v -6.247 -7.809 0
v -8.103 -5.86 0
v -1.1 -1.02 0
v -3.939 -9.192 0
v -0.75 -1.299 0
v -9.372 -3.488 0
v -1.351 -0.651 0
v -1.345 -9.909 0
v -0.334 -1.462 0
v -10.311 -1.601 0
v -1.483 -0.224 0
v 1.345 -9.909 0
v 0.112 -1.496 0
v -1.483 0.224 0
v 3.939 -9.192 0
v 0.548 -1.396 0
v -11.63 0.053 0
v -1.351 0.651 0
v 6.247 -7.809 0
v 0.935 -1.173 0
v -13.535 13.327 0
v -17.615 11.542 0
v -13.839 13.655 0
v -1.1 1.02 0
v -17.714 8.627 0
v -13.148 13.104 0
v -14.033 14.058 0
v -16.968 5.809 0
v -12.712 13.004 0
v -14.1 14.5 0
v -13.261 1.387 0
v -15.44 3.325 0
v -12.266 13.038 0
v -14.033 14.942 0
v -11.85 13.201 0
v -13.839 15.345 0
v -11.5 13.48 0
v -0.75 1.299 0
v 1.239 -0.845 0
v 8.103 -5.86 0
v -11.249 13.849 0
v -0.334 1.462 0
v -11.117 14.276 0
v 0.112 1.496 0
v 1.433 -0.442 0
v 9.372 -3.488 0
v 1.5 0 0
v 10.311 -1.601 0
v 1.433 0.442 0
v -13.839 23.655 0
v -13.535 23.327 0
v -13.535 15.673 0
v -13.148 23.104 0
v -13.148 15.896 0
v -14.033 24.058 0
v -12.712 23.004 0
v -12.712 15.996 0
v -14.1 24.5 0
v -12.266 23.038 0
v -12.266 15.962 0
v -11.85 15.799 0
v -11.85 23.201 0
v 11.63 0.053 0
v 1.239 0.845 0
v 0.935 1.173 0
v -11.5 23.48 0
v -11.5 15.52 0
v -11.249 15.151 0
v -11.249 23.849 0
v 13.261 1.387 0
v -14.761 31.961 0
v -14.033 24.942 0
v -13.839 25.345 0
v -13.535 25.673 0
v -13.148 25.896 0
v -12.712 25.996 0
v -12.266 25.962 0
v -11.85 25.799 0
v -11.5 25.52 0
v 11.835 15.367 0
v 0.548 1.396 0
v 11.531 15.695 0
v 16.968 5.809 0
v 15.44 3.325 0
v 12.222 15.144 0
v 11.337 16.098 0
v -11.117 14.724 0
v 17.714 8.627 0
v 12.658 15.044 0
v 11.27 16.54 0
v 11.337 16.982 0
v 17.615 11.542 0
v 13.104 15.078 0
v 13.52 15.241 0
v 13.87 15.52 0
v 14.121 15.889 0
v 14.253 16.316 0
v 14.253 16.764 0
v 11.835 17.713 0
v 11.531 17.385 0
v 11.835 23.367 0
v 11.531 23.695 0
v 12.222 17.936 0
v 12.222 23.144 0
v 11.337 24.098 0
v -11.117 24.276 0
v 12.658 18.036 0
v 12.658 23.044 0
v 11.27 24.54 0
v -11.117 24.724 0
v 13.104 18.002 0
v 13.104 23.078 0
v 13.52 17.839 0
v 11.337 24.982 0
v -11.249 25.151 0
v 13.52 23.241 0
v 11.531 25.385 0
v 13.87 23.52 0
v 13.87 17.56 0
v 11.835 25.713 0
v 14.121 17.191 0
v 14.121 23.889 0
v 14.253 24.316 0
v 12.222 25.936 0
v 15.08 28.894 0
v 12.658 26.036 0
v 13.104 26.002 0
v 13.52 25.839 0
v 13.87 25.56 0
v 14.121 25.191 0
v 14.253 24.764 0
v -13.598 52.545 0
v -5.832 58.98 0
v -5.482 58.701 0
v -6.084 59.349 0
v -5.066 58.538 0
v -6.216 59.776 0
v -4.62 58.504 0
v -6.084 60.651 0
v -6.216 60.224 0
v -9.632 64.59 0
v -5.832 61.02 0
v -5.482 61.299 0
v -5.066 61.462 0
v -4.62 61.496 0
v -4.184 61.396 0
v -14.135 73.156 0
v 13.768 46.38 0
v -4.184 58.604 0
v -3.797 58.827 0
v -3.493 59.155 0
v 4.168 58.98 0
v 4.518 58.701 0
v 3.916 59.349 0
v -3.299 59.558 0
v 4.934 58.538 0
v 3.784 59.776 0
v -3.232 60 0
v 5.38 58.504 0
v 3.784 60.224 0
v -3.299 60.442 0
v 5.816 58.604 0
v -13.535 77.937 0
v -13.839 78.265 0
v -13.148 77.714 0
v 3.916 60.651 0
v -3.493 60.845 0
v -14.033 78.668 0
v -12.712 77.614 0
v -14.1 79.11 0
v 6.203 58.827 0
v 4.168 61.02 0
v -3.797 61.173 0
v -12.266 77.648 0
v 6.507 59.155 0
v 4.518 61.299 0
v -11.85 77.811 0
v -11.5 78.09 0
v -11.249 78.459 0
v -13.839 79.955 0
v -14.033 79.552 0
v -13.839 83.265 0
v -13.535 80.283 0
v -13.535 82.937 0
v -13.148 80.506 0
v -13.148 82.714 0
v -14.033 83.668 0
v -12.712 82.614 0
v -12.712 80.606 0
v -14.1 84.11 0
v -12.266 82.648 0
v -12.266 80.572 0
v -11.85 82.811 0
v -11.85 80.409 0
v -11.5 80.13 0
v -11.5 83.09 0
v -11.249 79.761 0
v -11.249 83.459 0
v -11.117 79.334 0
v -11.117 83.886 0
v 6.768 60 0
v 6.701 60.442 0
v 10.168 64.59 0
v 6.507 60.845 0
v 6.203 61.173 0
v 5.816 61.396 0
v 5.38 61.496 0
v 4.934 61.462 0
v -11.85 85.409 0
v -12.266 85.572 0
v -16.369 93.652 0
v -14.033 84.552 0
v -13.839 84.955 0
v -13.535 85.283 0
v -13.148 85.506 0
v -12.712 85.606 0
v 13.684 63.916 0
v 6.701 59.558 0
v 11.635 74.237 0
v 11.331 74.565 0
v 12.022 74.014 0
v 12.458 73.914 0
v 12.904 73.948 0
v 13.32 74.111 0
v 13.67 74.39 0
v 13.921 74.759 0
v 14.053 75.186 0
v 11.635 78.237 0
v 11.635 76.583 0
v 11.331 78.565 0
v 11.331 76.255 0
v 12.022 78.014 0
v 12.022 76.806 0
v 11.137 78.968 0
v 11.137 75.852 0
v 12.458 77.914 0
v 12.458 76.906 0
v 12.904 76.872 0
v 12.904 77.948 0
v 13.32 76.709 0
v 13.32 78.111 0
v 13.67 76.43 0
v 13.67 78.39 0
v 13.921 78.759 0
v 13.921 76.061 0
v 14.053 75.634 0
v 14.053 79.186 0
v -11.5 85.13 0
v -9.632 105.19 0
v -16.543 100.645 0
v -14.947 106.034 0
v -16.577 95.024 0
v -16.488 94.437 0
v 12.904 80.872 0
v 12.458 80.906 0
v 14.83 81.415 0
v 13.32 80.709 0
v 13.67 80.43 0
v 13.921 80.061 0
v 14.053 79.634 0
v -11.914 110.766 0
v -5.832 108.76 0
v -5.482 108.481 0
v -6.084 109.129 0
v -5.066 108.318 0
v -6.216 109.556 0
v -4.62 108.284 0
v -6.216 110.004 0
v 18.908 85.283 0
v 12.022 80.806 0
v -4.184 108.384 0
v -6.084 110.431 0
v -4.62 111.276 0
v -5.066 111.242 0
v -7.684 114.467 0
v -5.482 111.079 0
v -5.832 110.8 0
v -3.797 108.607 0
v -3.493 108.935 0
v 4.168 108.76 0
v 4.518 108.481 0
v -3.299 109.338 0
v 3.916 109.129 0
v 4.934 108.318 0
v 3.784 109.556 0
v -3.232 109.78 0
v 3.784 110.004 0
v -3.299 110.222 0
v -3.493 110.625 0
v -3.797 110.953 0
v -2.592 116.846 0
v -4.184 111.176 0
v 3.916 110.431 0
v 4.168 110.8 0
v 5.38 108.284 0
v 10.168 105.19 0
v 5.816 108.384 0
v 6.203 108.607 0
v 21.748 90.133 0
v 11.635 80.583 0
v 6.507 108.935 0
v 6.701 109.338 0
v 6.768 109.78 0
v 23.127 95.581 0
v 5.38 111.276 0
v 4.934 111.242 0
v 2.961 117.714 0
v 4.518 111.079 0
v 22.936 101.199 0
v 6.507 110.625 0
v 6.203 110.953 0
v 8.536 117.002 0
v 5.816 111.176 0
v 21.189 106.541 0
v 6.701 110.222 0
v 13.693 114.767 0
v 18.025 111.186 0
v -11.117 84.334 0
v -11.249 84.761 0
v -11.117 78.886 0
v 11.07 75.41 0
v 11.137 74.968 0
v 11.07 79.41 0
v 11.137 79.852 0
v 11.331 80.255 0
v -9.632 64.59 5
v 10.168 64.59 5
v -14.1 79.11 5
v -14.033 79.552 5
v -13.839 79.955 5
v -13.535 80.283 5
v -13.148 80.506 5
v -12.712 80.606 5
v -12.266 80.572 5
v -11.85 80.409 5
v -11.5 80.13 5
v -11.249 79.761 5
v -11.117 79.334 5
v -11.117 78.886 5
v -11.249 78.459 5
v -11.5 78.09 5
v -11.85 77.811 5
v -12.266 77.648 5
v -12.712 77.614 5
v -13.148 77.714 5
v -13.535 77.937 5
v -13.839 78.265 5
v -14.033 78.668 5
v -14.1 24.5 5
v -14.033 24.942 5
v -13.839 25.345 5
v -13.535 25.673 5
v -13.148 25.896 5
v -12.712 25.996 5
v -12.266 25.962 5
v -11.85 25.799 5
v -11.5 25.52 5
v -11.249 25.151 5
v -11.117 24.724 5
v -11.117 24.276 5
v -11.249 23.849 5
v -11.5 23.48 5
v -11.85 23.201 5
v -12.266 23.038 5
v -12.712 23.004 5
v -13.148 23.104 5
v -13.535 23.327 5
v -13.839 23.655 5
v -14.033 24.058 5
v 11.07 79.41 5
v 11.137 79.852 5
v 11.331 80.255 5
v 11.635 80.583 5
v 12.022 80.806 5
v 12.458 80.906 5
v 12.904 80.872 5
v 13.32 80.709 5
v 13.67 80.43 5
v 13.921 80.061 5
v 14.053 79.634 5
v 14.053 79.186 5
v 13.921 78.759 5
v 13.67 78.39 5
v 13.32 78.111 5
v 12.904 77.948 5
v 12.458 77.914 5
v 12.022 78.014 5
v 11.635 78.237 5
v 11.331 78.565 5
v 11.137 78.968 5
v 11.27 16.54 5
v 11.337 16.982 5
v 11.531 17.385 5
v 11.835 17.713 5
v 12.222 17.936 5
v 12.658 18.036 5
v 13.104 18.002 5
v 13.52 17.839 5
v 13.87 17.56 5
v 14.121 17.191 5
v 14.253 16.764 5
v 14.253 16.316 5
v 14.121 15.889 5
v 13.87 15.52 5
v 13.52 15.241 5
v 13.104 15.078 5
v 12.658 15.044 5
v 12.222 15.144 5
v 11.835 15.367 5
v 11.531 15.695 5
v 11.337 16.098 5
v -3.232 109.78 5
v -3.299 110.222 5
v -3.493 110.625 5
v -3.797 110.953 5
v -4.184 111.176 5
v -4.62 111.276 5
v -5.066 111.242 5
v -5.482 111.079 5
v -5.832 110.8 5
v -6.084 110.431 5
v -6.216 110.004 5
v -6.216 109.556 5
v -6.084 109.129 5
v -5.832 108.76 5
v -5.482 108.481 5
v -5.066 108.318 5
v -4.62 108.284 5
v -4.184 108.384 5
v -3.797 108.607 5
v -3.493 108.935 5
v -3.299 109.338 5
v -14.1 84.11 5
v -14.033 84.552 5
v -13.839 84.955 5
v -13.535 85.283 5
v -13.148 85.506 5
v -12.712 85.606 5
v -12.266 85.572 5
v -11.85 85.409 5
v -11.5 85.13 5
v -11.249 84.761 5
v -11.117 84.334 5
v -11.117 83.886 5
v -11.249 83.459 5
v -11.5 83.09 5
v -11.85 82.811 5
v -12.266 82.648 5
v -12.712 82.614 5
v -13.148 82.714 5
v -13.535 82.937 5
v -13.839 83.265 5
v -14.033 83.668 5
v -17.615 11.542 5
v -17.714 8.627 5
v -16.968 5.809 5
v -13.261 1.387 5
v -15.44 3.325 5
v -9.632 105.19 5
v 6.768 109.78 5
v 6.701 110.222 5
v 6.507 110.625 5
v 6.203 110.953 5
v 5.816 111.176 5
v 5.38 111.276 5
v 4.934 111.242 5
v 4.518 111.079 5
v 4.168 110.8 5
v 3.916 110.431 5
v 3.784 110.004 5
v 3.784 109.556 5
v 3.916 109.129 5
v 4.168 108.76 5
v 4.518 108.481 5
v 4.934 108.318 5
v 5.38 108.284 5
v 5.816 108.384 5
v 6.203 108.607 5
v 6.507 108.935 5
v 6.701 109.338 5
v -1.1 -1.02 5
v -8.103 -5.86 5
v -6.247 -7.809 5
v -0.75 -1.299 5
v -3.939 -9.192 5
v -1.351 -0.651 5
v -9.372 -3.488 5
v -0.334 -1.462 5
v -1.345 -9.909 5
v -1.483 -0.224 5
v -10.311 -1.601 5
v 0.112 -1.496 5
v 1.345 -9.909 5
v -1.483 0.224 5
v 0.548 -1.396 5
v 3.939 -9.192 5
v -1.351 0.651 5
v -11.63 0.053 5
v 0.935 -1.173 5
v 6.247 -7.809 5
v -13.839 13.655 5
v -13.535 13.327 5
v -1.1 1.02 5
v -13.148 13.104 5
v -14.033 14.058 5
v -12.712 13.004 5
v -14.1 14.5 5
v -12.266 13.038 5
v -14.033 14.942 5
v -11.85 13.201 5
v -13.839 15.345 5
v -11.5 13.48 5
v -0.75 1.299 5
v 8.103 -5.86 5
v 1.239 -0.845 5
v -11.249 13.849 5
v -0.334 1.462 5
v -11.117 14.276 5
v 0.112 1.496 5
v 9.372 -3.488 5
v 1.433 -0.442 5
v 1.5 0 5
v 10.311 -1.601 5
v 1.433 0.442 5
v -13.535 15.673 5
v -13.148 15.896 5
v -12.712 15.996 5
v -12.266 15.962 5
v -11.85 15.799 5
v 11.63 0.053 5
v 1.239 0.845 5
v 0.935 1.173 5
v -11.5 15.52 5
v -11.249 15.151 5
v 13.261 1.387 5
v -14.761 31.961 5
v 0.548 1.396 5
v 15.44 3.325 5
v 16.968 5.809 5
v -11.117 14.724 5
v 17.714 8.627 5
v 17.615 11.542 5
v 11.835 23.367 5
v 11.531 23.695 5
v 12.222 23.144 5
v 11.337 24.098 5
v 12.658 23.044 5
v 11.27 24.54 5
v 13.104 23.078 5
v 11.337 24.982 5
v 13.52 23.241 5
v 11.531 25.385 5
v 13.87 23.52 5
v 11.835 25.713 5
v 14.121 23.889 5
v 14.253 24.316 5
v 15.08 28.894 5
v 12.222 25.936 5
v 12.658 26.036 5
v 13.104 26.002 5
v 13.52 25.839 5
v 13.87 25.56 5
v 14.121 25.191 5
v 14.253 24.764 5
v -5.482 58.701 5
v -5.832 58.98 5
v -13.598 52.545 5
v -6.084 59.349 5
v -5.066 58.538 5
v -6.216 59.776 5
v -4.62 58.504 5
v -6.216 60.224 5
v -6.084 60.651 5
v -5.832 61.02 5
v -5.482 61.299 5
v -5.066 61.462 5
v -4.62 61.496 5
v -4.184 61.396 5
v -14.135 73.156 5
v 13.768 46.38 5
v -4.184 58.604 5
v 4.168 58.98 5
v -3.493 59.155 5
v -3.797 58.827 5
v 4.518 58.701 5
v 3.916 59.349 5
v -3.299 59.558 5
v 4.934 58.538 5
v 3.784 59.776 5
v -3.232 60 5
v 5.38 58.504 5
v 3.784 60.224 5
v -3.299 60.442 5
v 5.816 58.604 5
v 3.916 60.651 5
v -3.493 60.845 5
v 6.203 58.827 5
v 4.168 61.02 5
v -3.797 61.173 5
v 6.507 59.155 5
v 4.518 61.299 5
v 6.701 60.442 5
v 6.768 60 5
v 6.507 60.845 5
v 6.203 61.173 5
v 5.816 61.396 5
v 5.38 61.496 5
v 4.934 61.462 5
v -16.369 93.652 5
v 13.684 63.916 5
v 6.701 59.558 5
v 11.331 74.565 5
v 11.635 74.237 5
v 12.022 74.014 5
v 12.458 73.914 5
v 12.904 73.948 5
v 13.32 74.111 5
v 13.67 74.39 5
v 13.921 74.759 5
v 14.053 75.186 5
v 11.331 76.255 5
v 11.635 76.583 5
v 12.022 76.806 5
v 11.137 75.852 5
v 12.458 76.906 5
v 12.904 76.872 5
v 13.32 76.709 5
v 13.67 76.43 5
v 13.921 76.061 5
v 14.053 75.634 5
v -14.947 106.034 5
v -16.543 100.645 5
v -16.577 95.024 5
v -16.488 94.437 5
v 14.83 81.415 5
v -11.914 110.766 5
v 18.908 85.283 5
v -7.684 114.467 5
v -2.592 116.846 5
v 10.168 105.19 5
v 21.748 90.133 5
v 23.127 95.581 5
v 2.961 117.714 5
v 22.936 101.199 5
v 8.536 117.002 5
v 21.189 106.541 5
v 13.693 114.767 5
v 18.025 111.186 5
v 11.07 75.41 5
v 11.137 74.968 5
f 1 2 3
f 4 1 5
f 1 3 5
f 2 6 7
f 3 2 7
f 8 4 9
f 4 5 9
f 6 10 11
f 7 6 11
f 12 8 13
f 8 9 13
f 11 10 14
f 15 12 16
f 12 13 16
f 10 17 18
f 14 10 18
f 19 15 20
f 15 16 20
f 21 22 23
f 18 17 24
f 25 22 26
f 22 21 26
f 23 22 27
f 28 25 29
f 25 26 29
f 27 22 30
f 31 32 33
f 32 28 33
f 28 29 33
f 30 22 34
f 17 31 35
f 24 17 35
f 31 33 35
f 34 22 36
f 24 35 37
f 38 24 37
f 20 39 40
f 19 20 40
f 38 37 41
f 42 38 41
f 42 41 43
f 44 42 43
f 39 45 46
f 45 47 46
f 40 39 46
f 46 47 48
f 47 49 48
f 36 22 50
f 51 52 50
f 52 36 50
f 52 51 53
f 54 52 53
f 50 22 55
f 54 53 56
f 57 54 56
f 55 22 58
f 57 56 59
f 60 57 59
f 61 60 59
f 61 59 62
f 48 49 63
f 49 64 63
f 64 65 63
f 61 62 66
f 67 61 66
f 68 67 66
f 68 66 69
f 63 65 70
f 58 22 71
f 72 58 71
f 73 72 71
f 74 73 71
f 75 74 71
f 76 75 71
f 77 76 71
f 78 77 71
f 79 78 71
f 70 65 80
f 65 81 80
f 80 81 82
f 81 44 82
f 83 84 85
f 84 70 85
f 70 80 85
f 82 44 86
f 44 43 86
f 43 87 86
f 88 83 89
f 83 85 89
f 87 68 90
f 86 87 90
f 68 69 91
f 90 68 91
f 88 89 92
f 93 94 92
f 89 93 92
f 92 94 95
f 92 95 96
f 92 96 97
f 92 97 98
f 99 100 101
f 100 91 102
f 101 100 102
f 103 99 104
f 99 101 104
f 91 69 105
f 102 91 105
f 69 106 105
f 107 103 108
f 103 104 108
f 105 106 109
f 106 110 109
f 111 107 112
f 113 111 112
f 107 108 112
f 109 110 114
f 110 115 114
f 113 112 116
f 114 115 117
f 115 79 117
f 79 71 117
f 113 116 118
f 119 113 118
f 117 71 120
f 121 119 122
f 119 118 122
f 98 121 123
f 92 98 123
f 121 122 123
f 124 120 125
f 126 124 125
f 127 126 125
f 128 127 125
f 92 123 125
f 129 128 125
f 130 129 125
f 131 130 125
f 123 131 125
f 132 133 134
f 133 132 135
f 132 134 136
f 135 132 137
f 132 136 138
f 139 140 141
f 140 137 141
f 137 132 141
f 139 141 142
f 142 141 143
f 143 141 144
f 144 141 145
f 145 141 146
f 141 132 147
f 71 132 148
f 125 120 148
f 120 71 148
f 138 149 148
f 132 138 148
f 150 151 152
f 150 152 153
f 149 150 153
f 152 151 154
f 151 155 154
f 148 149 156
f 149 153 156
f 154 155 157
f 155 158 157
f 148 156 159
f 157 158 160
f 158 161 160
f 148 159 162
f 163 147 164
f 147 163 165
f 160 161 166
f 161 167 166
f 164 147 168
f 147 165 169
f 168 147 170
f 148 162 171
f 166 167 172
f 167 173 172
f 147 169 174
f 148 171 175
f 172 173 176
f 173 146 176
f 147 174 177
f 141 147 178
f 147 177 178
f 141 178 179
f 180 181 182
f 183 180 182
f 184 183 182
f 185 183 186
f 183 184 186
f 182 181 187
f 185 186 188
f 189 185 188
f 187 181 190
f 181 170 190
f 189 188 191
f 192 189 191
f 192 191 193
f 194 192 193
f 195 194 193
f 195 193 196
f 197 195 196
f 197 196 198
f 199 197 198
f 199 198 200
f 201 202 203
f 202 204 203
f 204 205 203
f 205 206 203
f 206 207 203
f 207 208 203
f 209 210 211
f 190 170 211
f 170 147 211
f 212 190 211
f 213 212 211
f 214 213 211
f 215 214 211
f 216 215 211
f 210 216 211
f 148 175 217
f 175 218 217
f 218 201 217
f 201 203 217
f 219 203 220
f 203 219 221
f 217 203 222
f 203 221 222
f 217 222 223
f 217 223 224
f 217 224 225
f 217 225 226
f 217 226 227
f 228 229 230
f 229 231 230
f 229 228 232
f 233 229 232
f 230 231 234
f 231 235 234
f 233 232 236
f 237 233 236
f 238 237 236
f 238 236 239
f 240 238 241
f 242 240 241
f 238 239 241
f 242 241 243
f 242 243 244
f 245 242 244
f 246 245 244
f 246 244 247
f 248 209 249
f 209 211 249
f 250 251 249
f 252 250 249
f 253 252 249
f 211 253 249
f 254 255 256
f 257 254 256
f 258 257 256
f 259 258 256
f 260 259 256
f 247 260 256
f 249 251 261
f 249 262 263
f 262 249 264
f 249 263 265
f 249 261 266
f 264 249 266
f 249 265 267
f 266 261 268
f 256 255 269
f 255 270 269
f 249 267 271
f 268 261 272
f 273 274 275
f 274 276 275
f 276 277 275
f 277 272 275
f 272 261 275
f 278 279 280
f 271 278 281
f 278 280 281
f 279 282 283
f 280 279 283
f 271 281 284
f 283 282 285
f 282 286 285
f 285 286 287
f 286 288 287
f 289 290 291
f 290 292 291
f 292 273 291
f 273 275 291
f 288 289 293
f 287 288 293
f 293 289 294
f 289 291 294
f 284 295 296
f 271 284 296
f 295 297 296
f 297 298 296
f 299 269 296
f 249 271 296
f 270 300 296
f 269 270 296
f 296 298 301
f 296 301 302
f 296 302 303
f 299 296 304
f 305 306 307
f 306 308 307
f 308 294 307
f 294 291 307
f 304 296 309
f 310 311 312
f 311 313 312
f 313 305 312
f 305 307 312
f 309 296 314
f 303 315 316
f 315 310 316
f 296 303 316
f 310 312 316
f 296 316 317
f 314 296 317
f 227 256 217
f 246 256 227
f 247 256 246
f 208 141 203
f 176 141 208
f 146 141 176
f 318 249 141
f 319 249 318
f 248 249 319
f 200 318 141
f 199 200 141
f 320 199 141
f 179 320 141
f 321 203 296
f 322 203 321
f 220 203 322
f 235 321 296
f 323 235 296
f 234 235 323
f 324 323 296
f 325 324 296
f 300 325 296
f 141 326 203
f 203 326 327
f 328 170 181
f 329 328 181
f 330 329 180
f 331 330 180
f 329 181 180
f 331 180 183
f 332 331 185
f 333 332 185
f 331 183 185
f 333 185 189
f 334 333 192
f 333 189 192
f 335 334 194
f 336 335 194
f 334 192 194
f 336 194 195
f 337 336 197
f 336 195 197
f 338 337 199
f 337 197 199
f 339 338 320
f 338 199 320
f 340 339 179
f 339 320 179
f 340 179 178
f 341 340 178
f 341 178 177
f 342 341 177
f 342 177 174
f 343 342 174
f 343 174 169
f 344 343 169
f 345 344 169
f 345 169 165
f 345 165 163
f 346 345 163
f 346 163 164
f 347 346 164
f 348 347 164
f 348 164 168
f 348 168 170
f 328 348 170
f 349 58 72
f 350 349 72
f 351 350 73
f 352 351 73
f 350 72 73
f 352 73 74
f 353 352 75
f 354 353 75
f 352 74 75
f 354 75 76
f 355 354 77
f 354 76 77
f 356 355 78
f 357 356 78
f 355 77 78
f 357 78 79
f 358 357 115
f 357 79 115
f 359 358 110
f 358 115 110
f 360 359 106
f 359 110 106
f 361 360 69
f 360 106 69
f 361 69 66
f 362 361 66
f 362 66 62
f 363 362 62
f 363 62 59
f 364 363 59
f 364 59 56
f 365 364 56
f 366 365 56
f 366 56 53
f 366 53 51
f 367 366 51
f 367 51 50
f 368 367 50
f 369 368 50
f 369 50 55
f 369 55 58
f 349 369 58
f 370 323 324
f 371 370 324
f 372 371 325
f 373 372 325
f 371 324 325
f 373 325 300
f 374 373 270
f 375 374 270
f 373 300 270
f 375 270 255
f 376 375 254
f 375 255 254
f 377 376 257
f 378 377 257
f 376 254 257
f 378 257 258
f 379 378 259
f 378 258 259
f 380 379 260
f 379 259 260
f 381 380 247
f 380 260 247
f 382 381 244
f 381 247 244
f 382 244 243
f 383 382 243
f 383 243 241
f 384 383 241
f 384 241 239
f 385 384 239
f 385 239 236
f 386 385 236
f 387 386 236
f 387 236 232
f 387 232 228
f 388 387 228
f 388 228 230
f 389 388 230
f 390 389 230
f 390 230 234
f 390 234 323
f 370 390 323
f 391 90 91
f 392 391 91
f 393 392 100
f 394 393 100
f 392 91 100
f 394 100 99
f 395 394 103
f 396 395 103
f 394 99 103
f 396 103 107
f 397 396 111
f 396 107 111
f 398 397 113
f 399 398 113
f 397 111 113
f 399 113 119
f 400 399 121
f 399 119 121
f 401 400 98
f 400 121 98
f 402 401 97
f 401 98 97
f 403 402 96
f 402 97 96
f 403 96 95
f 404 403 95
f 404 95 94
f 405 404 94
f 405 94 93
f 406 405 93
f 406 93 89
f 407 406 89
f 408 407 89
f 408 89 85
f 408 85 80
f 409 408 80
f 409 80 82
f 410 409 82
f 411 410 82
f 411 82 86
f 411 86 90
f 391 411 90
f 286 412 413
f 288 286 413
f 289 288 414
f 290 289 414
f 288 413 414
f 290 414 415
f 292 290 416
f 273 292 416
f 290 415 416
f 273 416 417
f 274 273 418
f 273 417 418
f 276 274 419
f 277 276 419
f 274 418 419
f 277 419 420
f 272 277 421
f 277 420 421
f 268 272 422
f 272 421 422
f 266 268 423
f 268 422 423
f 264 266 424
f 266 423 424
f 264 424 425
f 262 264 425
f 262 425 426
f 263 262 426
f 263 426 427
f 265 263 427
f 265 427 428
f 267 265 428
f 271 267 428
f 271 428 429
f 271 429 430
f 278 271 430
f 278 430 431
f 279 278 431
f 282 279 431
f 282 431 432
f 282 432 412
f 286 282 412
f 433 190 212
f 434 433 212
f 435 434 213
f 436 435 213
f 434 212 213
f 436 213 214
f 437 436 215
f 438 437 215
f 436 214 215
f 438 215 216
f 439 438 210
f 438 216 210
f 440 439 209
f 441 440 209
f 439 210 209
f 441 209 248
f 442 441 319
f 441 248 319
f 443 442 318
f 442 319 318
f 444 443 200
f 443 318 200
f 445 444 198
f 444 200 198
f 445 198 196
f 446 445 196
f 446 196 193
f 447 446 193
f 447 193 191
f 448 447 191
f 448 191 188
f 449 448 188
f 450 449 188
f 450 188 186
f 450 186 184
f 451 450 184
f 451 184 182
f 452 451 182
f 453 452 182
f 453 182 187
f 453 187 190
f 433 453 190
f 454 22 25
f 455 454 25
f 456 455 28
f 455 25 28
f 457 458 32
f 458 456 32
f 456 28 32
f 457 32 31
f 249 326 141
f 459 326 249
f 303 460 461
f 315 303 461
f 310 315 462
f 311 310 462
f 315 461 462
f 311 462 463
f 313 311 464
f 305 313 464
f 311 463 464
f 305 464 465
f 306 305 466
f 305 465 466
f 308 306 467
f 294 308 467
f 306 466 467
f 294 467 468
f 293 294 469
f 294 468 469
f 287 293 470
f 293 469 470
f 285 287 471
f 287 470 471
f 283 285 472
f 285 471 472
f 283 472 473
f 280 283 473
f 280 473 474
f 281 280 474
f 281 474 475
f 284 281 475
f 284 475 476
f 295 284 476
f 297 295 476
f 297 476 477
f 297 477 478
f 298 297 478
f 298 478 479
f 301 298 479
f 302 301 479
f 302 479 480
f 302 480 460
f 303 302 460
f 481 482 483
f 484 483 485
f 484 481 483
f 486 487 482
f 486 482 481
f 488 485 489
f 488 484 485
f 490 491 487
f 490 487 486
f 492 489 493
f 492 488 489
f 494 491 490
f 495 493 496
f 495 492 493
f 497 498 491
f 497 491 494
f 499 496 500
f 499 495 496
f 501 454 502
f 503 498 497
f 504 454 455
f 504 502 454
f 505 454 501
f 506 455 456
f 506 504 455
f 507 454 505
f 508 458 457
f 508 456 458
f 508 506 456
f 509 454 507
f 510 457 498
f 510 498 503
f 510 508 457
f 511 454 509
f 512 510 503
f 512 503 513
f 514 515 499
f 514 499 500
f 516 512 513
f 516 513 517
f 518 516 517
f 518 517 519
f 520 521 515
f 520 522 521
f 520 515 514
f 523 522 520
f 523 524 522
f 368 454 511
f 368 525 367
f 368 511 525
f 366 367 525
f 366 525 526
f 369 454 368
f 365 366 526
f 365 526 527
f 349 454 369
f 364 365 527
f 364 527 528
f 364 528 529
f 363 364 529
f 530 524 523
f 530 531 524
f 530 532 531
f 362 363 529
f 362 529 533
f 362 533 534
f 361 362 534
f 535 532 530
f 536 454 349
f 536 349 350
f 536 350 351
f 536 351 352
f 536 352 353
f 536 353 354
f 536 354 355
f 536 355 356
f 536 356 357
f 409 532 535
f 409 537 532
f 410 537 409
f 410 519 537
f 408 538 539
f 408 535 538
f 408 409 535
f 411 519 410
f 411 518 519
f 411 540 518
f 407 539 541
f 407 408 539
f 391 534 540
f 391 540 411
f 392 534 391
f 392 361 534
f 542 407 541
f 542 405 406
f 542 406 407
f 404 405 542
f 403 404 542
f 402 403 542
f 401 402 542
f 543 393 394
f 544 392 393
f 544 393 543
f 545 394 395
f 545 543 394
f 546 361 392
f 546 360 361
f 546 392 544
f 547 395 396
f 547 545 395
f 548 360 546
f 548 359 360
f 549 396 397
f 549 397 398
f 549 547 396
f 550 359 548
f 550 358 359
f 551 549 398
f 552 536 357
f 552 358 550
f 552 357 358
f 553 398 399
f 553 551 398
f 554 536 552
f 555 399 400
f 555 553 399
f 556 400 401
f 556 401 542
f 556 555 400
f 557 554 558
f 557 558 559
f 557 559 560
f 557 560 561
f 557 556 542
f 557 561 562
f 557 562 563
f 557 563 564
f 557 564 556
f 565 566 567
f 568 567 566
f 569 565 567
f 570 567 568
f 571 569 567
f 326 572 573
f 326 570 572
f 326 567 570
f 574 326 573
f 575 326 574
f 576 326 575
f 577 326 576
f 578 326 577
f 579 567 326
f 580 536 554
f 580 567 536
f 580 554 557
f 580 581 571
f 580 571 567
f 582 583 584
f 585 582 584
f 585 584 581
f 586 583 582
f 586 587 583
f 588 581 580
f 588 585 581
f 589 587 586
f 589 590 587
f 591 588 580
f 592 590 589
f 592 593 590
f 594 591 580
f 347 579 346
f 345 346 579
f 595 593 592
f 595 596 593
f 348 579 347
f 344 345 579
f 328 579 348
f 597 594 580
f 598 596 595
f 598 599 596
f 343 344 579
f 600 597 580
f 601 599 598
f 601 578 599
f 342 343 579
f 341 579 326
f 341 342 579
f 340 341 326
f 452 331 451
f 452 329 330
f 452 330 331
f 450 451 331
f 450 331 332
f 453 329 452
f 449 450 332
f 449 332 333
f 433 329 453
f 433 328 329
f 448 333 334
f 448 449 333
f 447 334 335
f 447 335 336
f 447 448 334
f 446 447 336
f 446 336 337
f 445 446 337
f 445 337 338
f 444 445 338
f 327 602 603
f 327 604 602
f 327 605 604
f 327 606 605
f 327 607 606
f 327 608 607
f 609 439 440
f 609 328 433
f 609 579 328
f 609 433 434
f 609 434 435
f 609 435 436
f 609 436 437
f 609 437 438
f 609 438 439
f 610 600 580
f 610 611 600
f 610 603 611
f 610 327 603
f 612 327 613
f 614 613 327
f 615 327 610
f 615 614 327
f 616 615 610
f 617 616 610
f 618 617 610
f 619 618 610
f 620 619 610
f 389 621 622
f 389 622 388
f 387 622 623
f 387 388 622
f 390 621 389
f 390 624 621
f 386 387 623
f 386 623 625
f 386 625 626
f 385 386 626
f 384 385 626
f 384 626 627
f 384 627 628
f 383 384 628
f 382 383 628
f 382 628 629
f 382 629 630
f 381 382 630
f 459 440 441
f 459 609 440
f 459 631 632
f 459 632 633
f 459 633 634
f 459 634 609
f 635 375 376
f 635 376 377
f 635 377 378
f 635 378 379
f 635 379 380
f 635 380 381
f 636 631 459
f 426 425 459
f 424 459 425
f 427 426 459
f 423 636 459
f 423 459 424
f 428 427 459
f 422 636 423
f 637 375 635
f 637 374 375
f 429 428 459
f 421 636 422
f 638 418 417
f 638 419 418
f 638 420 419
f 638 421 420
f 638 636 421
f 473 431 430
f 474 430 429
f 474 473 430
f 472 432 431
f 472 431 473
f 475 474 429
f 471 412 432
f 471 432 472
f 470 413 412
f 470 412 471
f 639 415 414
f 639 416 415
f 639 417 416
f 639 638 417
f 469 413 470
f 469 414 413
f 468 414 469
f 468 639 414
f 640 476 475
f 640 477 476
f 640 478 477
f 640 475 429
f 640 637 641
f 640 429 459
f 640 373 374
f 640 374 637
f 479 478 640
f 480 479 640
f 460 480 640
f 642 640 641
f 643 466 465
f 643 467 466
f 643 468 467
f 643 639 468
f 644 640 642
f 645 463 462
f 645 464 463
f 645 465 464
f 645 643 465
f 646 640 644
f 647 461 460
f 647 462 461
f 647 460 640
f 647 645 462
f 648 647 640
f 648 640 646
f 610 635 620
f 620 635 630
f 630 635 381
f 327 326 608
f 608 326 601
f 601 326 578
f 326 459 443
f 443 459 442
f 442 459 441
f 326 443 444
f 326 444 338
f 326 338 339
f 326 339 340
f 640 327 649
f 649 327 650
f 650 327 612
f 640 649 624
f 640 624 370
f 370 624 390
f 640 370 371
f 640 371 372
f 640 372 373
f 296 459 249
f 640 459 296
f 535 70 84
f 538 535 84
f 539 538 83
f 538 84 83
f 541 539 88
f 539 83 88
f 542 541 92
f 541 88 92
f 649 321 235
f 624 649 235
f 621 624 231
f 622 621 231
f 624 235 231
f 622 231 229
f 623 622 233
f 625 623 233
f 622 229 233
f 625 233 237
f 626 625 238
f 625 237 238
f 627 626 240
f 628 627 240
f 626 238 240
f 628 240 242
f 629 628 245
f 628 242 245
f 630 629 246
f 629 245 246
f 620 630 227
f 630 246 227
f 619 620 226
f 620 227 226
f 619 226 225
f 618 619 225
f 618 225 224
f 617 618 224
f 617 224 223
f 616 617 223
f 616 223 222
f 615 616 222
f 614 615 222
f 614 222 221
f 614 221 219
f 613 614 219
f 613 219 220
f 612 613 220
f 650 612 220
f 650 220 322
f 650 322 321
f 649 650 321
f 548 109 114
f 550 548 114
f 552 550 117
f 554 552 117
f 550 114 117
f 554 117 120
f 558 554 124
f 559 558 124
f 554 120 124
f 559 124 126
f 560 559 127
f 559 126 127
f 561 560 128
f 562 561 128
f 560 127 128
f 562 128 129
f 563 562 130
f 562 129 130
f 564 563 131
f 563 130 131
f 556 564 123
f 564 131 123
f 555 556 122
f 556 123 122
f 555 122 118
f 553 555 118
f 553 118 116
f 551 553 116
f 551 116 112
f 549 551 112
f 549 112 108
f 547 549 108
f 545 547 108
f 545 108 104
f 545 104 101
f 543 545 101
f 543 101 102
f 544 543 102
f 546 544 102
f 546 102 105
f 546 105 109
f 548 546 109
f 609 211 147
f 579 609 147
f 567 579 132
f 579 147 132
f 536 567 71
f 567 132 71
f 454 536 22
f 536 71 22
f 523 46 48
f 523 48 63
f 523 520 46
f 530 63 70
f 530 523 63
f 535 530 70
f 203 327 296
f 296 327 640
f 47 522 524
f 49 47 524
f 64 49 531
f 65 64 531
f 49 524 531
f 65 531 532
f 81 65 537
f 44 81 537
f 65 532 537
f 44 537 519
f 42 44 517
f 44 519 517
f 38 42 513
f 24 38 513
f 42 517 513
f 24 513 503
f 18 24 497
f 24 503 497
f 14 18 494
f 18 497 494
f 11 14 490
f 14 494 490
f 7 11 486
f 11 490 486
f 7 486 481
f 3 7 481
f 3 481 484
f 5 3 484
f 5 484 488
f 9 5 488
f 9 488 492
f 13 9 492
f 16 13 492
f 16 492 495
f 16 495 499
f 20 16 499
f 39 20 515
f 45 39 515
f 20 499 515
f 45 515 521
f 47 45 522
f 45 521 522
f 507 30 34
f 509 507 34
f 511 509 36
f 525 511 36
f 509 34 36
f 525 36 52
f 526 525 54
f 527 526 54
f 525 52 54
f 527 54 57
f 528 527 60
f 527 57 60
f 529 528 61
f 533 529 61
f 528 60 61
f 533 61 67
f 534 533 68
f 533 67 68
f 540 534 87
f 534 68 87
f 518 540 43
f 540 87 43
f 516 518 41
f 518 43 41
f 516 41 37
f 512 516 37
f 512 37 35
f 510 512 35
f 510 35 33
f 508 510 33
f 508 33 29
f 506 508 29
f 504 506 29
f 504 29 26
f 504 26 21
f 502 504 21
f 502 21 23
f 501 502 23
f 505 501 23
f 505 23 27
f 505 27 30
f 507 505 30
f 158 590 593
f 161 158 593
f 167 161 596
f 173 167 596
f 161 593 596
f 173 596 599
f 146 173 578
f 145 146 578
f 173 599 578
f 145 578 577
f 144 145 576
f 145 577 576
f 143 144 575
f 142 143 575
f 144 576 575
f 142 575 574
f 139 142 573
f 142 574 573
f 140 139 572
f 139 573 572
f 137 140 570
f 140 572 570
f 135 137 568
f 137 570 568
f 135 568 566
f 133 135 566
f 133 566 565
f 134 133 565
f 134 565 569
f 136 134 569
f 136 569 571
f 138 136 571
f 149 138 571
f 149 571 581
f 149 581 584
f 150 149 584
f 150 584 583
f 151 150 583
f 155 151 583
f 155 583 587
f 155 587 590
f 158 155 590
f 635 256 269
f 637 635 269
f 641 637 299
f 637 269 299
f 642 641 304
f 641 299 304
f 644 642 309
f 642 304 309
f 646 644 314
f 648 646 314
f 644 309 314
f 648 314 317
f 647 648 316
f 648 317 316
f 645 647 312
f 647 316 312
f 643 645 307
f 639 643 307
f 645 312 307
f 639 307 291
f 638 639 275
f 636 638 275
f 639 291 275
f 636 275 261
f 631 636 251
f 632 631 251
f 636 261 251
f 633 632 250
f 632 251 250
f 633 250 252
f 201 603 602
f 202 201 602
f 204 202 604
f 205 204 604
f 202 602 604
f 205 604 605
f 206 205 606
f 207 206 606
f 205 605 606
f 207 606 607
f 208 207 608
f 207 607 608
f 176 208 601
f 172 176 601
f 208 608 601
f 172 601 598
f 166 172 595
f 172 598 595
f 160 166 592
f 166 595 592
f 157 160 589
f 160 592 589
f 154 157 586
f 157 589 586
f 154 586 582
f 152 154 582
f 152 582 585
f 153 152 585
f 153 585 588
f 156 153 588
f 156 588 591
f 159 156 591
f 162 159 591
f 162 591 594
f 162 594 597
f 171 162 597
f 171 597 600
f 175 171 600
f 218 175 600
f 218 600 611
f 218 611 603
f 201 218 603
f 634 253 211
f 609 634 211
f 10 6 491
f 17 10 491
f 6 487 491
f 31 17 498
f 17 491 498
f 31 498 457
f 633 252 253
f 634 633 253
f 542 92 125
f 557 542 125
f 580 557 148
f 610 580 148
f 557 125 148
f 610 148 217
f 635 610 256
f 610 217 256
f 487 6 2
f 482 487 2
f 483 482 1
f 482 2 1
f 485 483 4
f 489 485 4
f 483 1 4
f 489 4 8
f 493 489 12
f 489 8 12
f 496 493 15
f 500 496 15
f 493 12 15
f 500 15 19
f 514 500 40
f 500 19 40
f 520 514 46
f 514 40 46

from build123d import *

# Parameters (mm, degrees)
RESSALTO_EXTRUS_O1_DEPTH = 5
FILETE3_R                = 10
FILETE4_R                = 10
ESBO_O2_R                = 1.5
CORTE_EXTRUS_O1_DEPTH    = 5
ESBO_O4_R                = 1.5
CORTE_EXTRUS_O3_DEPTH    = 10
ESBO_O5_W                = 19.8
ESBO_O5_H                = 40.6
CORTE_EXTRUS_O4_DEPTH    = 10
ESBO_O6_R                = 1.5
CORTE_EXTRUS_O5_DEPTH    = 10
ESBO_O7_R                = 1.5
CORTE_EXTRUS_O6_DEPTH    = 121.092170275


with BuildPart() as part:
    # Esboço1 → Ressalto-extrusão1 (new body)
    with BuildSketch(Plane.XY):
        with BuildLine():
            ThreePointArc((-10, 0), (0, -10), (10, 0))
            Line((10, 0), (20, 0))
            ThreePointArc((20, 0), (14.071698091, 40.495175194), (14.829943665, 81.414963086))
            ThreePointArc((14.829943665, 81.414963086), (11.193742071, 116.066691762), (-16.576524471, 95.024435265))
            Line((-16.576524471, 95.024435265), (-16.487894969, 94.437265709))
            Line((-16.487894969, 94.437265709), (-16.369382775, 93.652123615))
            ThreePointArc((-16.369382775, 93.652123615), (-13.756795166, 46.654405302), (-20, 0))
            Line((-20, 0), (-10, 0))
        make_face()
    extrude(amount=RESSALTO_EXTRUS_O1_DEPTH)

    # Filete3
    # the kernel refuses this fillet: 10 mm, written as the material it takes off along each edge
    with BuildSketch(Plane(origin=(20, 0, -29.463728433), x_dir=(-0.20232831186330175, 0.9793177493635794, 0), z_dir=(0, 0, 1))) as filete3_piece_1:
        with BuildLine():
            CenterArc((12.021201201, 9.997221658), FILETE3_R, 181.169168083, 87.480189)
            Line((2.023283119, 9.793177494), (1.823324757, 9.78909661))
            ThreePointArc((1.823324757, 9.78909661), (0.815778009, 4.937054409), (-0.19586355, 0.040465662))
            Line((-0.19586355, 0.040465662), (0.004714197, -0.199944433))
            ThreePointArc((0.004714197, -0.199944433), (5.892745687, -0.130541448), (11.780777177, -0.199944433))
            Line((11.780777177, -0.199944433), (11.785491373, 0))
        make_face()
    extrude(amount=63.927456867, mode=Mode.SUBTRACT)
    with BuildSketch(Plane(origin=(-20, 0, -29.463728433), x_dir=(1, 0, 0), z_dir=(0, 0, 1))) as filete3_piece_2:
        with BuildLine():
            CenterArc((12.222685959, 9.749854723), FILETE3_R, 169.67749742, 87.480189)
            Line((2.384538574, 11.541740887), (2.187775626, 11.57757861))
            ThreePointArc((2.187775626, 11.57757861), (1.06442773, 5.797282674), (-0.194855317, 0.045071116))
            Line((-0.194855317, 0.045071116), (0, -0.2))
            ThreePointArc((0, -0.2), (5, -0.2), (9.955546281, -0.194997094))
            Line((9.955546281, -0.194997094), (10, 0))
        make_face()
    extrude(amount=63.927456867, mode=Mode.SUBTRACT)

    # Filete4
    filete4_edges = [part.edges().sort_by_distance(p)[0] for p in [
        (10, 0, 2.5),
        (-10, 0, 2.5),
    ]]
    fillet(filete4_edges, radius=FILETE4_R)

    # Esboço2 → Corte-extrusão1 (cut)
    with BuildSketch(Plane.XY.offset(5)):
        Circle(ESBO_O2_R)
    extrude(amount=-CORTE_EXTRUS_O1_DEPTH, mode=Mode.SUBTRACT)

    # Esboço4 → Corte-extrusão3 (cut)
    with BuildSketch(Plane.XY.offset(5)):
        with Locations((-4.732435028, 109.78)):
            Circle(ESBO_O4_R)
        with Locations((5.267564972, 109.78)):
            Circle(ESBO_O4_R)
        with Locations((-4.732435028, 60)):
            Circle(ESBO_O4_R)
        with Locations((5.267564972, 60)):
            Circle(ESBO_O4_R)
    extrude(amount=-CORTE_EXTRUS_O3_DEPTH, mode=Mode.SUBTRACT)

    # Esboço5 → Corte-extrusão4 (cut)
    with BuildSketch(Plane.XY.offset(5)):
        with Locations((0.267564972, 84.89)):
            Rectangle(ESBO_O5_W, ESBO_O5_H)
    extrude(amount=-CORTE_EXTRUS_O4_DEPTH, mode=Mode.SUBTRACT)

    # Esboço6 → Corte-extrusão5 (cut)
    with BuildSketch(Plane(origin=(0, 0, 0), x_dir=(-1, 0, 0), z_dir=(0, 0, -1))):
        with Locations((12.6, 14.5)):
            Circle(ESBO_O6_R)
        with Locations((12.6, 24.5)):
            Circle(ESBO_O6_R)
        with Locations((12.6, 79.11)):
            Circle(ESBO_O6_R)
        with Locations((12.6, 84.11)):
            Circle(ESBO_O6_R)
    extrude(amount=-CORTE_EXTRUS_O5_DEPTH, mode=Mode.SUBTRACT)

    # Esboço7 → Corte-extrusão6 (cut, through all)
    with BuildSketch(Plane(origin=(0, 0, 0), x_dir=(-1, 0, 0), z_dir=(0, 0, -1))):
        with Locations((-12.77, 16.54)):
            Circle(ESBO_O7_R)
        with Locations((-12.77, 24.54)):
            Circle(ESBO_O7_R)
        with Locations((-12.57, 75.41)):
            Circle(ESBO_O7_R)
        with Locations((-12.57, 79.41)):
            Circle(ESBO_O7_R)
    extrude(amount=-CORTE_EXTRUS_O6_DEPTH, mode=Mode.SUBTRACT)


solid = part.part
